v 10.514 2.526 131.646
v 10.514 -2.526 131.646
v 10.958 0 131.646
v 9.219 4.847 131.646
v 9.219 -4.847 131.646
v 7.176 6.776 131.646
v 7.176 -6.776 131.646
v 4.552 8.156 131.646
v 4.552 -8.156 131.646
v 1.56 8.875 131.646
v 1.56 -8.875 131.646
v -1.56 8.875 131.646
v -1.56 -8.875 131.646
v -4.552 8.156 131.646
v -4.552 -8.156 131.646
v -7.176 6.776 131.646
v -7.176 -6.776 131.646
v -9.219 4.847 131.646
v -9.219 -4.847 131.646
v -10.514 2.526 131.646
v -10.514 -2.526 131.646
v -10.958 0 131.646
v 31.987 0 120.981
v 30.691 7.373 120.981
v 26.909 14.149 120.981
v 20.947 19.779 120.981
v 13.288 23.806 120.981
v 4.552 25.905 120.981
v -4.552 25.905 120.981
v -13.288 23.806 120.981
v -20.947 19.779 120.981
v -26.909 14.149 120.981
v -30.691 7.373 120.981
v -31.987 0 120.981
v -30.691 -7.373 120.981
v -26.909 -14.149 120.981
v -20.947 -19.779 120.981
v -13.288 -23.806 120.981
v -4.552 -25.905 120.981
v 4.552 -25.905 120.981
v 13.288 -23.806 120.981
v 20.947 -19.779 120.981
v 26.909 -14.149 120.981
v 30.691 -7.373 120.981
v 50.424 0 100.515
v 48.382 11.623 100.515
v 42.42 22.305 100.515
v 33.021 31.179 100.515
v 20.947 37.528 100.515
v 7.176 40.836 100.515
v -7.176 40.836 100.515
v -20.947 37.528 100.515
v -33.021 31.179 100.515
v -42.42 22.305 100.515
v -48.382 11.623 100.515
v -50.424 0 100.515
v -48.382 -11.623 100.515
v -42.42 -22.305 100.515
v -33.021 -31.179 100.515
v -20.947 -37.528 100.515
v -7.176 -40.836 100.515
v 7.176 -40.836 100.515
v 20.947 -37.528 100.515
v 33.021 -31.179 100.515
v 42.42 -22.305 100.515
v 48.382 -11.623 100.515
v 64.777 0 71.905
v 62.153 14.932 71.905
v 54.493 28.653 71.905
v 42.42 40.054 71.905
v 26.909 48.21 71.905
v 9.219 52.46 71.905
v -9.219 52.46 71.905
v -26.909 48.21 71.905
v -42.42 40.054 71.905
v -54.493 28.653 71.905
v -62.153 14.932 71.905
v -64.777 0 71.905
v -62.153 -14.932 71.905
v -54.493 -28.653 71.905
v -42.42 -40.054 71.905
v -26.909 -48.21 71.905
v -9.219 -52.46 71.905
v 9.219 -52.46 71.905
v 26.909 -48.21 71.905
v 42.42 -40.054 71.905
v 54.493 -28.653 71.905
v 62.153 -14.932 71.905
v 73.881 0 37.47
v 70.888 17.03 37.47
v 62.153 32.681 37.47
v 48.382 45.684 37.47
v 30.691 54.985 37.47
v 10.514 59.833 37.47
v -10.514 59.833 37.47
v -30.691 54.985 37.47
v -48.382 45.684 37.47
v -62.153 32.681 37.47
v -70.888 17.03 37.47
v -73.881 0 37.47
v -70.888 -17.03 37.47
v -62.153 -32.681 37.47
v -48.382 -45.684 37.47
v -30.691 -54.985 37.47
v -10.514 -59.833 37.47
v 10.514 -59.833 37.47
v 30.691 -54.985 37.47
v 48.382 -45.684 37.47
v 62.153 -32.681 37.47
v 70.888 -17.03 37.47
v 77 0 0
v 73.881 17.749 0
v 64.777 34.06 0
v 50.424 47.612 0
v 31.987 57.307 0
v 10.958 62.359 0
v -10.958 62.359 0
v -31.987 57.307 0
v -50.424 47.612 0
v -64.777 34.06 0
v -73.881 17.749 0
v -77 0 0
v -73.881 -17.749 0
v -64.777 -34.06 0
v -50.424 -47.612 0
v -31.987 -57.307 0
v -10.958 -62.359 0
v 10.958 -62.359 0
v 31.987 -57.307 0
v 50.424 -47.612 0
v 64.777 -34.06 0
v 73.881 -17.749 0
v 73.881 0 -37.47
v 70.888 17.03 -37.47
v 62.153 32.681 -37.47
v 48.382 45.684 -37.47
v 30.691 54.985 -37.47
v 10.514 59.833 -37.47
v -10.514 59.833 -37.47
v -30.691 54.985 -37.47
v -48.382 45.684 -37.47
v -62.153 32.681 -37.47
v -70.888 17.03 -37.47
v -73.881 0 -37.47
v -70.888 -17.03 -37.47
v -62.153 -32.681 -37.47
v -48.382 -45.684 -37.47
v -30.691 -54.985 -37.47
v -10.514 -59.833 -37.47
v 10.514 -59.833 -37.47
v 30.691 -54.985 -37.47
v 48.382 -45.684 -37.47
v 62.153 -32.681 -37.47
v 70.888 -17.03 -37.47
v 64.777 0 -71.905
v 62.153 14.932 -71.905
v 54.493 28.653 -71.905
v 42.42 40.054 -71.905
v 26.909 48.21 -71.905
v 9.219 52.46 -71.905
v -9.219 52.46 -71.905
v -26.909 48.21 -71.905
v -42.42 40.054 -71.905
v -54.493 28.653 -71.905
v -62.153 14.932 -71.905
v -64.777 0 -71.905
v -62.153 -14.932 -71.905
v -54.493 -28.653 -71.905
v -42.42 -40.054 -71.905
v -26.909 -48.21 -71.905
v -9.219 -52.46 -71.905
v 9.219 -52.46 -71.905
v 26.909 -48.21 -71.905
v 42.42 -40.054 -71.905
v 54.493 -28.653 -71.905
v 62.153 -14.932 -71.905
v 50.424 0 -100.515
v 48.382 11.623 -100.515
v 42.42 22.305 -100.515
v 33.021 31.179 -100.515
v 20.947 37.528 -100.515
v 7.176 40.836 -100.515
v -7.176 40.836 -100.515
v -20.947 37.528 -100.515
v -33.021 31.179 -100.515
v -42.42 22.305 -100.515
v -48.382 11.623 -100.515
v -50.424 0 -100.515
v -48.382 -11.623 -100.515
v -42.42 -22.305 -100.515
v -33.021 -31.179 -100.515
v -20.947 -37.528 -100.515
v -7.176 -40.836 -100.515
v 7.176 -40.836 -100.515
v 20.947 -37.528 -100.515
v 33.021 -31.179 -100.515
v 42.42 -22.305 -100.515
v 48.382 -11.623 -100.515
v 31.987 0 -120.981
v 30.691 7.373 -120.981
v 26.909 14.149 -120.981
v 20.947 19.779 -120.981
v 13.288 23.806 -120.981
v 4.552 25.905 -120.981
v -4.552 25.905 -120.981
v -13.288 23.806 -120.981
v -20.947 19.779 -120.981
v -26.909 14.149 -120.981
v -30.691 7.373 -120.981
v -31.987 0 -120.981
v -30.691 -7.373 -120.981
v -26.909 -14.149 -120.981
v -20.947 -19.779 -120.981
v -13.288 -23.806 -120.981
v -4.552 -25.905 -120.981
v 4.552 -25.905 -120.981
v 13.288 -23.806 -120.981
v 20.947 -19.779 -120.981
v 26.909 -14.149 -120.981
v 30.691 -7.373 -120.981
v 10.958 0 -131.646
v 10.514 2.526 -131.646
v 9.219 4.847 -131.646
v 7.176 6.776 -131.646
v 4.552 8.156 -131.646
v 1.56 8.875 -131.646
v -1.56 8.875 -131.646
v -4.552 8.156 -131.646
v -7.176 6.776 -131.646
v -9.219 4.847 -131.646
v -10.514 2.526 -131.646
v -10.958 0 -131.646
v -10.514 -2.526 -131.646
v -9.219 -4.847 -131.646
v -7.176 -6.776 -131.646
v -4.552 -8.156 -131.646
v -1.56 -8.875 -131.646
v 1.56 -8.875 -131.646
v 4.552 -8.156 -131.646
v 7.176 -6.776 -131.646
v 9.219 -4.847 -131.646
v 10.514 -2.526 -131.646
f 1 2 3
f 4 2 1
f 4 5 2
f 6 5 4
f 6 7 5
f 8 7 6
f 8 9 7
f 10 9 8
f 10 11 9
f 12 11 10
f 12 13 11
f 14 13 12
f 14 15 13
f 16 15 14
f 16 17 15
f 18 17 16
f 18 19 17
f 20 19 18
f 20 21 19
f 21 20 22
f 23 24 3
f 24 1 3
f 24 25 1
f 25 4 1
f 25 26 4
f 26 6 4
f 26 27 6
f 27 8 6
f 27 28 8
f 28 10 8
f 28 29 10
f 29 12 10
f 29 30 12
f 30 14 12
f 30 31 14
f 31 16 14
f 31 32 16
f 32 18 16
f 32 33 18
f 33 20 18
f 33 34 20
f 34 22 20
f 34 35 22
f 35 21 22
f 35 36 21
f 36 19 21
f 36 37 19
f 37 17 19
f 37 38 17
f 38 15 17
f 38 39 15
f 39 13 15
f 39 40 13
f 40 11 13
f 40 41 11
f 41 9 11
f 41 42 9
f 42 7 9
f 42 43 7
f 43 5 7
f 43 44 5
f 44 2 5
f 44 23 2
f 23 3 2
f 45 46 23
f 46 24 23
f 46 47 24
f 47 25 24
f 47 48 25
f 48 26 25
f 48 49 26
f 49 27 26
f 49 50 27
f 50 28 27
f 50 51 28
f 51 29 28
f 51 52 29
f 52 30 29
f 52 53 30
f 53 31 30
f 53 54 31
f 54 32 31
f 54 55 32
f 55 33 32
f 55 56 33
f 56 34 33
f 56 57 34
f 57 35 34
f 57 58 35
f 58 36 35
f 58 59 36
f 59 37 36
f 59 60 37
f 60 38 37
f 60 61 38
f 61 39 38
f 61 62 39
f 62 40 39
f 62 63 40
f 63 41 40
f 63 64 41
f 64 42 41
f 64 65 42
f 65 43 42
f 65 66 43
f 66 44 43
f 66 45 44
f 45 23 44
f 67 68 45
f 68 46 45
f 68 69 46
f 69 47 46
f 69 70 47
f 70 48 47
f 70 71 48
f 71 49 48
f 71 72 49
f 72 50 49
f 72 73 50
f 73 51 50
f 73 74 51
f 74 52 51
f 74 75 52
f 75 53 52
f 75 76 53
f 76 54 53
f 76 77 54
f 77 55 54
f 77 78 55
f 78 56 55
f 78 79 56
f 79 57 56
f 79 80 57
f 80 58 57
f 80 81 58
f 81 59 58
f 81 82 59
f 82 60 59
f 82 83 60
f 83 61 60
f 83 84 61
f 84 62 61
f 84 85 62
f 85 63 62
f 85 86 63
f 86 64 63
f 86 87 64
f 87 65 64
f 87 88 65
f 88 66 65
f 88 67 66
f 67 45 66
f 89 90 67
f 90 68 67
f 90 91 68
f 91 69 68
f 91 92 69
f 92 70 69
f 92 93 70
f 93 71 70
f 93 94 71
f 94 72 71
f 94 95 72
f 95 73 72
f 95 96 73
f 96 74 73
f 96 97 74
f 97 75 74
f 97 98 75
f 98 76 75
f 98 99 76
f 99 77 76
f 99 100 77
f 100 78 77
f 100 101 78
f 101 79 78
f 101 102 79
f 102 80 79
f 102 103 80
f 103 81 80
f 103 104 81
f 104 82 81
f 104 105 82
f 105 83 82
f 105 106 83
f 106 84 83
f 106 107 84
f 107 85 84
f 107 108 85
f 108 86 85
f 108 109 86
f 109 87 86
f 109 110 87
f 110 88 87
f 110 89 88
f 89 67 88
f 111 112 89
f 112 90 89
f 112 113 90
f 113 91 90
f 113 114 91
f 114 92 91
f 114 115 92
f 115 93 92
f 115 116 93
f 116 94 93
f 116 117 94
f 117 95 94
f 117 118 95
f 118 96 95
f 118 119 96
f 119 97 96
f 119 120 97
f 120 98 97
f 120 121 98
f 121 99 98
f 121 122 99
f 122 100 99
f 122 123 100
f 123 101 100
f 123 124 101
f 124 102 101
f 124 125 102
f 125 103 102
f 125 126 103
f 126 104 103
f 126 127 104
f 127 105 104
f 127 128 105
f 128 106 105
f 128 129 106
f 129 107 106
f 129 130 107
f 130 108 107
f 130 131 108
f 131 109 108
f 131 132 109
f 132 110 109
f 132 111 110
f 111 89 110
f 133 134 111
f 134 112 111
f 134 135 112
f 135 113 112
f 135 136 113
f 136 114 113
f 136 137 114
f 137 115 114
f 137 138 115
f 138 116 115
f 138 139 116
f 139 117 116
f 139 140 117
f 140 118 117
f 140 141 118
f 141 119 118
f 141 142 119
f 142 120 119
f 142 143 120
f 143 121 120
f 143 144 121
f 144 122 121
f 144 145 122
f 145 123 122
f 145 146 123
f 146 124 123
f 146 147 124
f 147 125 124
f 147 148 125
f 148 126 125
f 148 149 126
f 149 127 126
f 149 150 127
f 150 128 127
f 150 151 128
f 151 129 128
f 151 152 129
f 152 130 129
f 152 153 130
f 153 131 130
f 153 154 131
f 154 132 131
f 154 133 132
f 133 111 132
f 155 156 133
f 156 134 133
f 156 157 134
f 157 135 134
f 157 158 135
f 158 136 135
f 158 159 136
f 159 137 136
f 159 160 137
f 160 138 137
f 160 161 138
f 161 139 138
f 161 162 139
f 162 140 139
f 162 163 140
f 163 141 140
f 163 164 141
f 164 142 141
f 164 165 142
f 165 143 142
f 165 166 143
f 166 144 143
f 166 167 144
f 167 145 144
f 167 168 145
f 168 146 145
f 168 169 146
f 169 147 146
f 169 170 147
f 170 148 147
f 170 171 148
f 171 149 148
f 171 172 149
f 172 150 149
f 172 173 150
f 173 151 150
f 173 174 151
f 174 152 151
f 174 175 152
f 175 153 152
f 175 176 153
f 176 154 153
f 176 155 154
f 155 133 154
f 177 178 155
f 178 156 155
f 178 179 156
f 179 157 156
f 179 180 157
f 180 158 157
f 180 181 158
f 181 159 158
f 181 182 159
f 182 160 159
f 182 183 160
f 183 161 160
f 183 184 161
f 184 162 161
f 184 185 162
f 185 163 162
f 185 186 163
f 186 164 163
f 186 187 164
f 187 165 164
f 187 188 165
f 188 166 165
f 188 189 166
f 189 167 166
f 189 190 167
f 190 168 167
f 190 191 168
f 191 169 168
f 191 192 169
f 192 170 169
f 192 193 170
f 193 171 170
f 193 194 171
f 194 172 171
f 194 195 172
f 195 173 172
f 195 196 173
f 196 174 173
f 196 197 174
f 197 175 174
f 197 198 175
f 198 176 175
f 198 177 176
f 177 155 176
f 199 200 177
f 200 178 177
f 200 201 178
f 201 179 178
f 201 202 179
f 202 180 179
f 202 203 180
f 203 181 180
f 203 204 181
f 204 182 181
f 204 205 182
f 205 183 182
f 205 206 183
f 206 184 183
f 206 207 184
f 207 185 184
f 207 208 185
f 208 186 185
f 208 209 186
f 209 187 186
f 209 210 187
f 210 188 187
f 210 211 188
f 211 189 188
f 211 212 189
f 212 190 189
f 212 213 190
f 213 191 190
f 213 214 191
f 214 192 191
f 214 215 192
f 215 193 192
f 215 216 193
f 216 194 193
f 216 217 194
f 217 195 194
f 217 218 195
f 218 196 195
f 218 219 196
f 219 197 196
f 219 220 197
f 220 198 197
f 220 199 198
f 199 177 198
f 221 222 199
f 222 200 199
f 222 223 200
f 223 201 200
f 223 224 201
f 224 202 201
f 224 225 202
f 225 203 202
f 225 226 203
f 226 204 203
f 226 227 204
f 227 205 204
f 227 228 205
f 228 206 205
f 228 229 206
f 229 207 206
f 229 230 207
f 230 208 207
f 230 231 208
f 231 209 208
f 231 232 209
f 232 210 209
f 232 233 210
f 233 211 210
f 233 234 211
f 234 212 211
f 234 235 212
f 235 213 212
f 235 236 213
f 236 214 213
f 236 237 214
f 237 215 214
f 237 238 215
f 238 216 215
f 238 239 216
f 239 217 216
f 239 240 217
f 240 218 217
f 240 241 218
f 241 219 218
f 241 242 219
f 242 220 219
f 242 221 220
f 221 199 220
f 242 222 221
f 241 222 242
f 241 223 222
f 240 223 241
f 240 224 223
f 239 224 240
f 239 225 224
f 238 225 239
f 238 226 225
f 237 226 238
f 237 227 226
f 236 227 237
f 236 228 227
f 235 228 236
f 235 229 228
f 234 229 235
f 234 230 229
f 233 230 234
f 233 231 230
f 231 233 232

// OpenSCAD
// Generated by SolidPython 1.0.1 on 2020-07-29 00:46:49


scale(v = [11, 9, 19]) {
	sphere(r = 7);
}
/***********************************************
*********      SolidPython code:      **********
************************************************
 
# import packages: SolidPython
from solid import *
from solid.utils import *
from itertools import chain, combinations, permutations


class Resize:

    def __init__(self, scad_file):
        self.scad_file = scad_file
        #self.scad_file = import_scad(scad_file)
        # cone/cylinder param:
        self.r1 = 0
        self.r2 = 0
        self.h = 0
        # rectangular prism param:
        self.w = 0
        self.l = 0
        # ellipse param:
        self.r = 0

    # import OpenScad code (file name corresponds to shape)


    # classify shape + parameters
    def assign(self, param1, param2, param3):
        if self.scad_file == 'cone.scad':
            self.r1 = param1
            self.r2 = param2
            self.h = param3
        elif self.scad_file == 'cylinder.scad':
            self.r1 = param1
            self.r2 = param2
            self.h = param3
        elif self.scad_file == 'rectangularPrism.scad':
            self.h = param1
            self.l = param2
            self.w = param3
        else:
            self.r = param1
            self.h = param2

    # resize parameters
    def iterate(self):
        x = range(3, 20, 2)
        i = 1
        if self.scad_file == 'cone.scad':
            tempList = list(permutations(x, 2))
            for temp in tempList:
                param1 = temp[0]
                param2 = temp[1]
                filepath = 'produced_scad_files/' + 'cone' + str(param1) + '_' + str(param2) + '_' + '.scad'
                scad_render_to_file(cylinder(h=param1, r1=param2, r2=0), filepath)

        elif self.scad_file == 'cylinder.scad':
            tempList = list(permutations(x, 3))
            for temp in tempList:
                param1 = temp[0]
                param2 = temp[1]
                filepath = 'produced_scad_files/' + 'cylinder' + str(param1) + '_' + str(param2) + '_' + '.scad'
                scad_render_to_file(cylinder(h=param1, r1=param2, r2=param2), filepath)

        elif self.scad_file == 'rectangularPrism.scad':
            tempList = list(permutations(x, 3))
            for temp in tempList:
                param1 = temp[0]
                param2 = temp[1]
                param3 = temp[2]
                filepath = 'produced_scad_files/' + 'rectangularPrism' + str(param1) + '_' + str(param2) + '_' + str(
                    param3) + '.scad'
                scad_render_to_file(cube(size=(param1, param2, param3)), filepath)

        elif self.scad_file == 'ellipse.scad':
            tempList = list(permutations(x, 4))
            for temp in tempList:
                param1 = temp[0]
                param2 = temp[1]
                param3 = temp[2]
                param4 = temp[3]
                filepath = 'produced_scad_files/' + 'ellipse' + str(param1) + '_' + str(param2) + '_' + str(param3) + '_' + str(param4) + '.scad'
                scad_render_to_file(scale([param1, param2, param3])(sphere(r=param4)), filepath)

    def render_to_scadfile(self):
        scad_render_to_file(scad, 'example.scad') 
 
************************************************/
